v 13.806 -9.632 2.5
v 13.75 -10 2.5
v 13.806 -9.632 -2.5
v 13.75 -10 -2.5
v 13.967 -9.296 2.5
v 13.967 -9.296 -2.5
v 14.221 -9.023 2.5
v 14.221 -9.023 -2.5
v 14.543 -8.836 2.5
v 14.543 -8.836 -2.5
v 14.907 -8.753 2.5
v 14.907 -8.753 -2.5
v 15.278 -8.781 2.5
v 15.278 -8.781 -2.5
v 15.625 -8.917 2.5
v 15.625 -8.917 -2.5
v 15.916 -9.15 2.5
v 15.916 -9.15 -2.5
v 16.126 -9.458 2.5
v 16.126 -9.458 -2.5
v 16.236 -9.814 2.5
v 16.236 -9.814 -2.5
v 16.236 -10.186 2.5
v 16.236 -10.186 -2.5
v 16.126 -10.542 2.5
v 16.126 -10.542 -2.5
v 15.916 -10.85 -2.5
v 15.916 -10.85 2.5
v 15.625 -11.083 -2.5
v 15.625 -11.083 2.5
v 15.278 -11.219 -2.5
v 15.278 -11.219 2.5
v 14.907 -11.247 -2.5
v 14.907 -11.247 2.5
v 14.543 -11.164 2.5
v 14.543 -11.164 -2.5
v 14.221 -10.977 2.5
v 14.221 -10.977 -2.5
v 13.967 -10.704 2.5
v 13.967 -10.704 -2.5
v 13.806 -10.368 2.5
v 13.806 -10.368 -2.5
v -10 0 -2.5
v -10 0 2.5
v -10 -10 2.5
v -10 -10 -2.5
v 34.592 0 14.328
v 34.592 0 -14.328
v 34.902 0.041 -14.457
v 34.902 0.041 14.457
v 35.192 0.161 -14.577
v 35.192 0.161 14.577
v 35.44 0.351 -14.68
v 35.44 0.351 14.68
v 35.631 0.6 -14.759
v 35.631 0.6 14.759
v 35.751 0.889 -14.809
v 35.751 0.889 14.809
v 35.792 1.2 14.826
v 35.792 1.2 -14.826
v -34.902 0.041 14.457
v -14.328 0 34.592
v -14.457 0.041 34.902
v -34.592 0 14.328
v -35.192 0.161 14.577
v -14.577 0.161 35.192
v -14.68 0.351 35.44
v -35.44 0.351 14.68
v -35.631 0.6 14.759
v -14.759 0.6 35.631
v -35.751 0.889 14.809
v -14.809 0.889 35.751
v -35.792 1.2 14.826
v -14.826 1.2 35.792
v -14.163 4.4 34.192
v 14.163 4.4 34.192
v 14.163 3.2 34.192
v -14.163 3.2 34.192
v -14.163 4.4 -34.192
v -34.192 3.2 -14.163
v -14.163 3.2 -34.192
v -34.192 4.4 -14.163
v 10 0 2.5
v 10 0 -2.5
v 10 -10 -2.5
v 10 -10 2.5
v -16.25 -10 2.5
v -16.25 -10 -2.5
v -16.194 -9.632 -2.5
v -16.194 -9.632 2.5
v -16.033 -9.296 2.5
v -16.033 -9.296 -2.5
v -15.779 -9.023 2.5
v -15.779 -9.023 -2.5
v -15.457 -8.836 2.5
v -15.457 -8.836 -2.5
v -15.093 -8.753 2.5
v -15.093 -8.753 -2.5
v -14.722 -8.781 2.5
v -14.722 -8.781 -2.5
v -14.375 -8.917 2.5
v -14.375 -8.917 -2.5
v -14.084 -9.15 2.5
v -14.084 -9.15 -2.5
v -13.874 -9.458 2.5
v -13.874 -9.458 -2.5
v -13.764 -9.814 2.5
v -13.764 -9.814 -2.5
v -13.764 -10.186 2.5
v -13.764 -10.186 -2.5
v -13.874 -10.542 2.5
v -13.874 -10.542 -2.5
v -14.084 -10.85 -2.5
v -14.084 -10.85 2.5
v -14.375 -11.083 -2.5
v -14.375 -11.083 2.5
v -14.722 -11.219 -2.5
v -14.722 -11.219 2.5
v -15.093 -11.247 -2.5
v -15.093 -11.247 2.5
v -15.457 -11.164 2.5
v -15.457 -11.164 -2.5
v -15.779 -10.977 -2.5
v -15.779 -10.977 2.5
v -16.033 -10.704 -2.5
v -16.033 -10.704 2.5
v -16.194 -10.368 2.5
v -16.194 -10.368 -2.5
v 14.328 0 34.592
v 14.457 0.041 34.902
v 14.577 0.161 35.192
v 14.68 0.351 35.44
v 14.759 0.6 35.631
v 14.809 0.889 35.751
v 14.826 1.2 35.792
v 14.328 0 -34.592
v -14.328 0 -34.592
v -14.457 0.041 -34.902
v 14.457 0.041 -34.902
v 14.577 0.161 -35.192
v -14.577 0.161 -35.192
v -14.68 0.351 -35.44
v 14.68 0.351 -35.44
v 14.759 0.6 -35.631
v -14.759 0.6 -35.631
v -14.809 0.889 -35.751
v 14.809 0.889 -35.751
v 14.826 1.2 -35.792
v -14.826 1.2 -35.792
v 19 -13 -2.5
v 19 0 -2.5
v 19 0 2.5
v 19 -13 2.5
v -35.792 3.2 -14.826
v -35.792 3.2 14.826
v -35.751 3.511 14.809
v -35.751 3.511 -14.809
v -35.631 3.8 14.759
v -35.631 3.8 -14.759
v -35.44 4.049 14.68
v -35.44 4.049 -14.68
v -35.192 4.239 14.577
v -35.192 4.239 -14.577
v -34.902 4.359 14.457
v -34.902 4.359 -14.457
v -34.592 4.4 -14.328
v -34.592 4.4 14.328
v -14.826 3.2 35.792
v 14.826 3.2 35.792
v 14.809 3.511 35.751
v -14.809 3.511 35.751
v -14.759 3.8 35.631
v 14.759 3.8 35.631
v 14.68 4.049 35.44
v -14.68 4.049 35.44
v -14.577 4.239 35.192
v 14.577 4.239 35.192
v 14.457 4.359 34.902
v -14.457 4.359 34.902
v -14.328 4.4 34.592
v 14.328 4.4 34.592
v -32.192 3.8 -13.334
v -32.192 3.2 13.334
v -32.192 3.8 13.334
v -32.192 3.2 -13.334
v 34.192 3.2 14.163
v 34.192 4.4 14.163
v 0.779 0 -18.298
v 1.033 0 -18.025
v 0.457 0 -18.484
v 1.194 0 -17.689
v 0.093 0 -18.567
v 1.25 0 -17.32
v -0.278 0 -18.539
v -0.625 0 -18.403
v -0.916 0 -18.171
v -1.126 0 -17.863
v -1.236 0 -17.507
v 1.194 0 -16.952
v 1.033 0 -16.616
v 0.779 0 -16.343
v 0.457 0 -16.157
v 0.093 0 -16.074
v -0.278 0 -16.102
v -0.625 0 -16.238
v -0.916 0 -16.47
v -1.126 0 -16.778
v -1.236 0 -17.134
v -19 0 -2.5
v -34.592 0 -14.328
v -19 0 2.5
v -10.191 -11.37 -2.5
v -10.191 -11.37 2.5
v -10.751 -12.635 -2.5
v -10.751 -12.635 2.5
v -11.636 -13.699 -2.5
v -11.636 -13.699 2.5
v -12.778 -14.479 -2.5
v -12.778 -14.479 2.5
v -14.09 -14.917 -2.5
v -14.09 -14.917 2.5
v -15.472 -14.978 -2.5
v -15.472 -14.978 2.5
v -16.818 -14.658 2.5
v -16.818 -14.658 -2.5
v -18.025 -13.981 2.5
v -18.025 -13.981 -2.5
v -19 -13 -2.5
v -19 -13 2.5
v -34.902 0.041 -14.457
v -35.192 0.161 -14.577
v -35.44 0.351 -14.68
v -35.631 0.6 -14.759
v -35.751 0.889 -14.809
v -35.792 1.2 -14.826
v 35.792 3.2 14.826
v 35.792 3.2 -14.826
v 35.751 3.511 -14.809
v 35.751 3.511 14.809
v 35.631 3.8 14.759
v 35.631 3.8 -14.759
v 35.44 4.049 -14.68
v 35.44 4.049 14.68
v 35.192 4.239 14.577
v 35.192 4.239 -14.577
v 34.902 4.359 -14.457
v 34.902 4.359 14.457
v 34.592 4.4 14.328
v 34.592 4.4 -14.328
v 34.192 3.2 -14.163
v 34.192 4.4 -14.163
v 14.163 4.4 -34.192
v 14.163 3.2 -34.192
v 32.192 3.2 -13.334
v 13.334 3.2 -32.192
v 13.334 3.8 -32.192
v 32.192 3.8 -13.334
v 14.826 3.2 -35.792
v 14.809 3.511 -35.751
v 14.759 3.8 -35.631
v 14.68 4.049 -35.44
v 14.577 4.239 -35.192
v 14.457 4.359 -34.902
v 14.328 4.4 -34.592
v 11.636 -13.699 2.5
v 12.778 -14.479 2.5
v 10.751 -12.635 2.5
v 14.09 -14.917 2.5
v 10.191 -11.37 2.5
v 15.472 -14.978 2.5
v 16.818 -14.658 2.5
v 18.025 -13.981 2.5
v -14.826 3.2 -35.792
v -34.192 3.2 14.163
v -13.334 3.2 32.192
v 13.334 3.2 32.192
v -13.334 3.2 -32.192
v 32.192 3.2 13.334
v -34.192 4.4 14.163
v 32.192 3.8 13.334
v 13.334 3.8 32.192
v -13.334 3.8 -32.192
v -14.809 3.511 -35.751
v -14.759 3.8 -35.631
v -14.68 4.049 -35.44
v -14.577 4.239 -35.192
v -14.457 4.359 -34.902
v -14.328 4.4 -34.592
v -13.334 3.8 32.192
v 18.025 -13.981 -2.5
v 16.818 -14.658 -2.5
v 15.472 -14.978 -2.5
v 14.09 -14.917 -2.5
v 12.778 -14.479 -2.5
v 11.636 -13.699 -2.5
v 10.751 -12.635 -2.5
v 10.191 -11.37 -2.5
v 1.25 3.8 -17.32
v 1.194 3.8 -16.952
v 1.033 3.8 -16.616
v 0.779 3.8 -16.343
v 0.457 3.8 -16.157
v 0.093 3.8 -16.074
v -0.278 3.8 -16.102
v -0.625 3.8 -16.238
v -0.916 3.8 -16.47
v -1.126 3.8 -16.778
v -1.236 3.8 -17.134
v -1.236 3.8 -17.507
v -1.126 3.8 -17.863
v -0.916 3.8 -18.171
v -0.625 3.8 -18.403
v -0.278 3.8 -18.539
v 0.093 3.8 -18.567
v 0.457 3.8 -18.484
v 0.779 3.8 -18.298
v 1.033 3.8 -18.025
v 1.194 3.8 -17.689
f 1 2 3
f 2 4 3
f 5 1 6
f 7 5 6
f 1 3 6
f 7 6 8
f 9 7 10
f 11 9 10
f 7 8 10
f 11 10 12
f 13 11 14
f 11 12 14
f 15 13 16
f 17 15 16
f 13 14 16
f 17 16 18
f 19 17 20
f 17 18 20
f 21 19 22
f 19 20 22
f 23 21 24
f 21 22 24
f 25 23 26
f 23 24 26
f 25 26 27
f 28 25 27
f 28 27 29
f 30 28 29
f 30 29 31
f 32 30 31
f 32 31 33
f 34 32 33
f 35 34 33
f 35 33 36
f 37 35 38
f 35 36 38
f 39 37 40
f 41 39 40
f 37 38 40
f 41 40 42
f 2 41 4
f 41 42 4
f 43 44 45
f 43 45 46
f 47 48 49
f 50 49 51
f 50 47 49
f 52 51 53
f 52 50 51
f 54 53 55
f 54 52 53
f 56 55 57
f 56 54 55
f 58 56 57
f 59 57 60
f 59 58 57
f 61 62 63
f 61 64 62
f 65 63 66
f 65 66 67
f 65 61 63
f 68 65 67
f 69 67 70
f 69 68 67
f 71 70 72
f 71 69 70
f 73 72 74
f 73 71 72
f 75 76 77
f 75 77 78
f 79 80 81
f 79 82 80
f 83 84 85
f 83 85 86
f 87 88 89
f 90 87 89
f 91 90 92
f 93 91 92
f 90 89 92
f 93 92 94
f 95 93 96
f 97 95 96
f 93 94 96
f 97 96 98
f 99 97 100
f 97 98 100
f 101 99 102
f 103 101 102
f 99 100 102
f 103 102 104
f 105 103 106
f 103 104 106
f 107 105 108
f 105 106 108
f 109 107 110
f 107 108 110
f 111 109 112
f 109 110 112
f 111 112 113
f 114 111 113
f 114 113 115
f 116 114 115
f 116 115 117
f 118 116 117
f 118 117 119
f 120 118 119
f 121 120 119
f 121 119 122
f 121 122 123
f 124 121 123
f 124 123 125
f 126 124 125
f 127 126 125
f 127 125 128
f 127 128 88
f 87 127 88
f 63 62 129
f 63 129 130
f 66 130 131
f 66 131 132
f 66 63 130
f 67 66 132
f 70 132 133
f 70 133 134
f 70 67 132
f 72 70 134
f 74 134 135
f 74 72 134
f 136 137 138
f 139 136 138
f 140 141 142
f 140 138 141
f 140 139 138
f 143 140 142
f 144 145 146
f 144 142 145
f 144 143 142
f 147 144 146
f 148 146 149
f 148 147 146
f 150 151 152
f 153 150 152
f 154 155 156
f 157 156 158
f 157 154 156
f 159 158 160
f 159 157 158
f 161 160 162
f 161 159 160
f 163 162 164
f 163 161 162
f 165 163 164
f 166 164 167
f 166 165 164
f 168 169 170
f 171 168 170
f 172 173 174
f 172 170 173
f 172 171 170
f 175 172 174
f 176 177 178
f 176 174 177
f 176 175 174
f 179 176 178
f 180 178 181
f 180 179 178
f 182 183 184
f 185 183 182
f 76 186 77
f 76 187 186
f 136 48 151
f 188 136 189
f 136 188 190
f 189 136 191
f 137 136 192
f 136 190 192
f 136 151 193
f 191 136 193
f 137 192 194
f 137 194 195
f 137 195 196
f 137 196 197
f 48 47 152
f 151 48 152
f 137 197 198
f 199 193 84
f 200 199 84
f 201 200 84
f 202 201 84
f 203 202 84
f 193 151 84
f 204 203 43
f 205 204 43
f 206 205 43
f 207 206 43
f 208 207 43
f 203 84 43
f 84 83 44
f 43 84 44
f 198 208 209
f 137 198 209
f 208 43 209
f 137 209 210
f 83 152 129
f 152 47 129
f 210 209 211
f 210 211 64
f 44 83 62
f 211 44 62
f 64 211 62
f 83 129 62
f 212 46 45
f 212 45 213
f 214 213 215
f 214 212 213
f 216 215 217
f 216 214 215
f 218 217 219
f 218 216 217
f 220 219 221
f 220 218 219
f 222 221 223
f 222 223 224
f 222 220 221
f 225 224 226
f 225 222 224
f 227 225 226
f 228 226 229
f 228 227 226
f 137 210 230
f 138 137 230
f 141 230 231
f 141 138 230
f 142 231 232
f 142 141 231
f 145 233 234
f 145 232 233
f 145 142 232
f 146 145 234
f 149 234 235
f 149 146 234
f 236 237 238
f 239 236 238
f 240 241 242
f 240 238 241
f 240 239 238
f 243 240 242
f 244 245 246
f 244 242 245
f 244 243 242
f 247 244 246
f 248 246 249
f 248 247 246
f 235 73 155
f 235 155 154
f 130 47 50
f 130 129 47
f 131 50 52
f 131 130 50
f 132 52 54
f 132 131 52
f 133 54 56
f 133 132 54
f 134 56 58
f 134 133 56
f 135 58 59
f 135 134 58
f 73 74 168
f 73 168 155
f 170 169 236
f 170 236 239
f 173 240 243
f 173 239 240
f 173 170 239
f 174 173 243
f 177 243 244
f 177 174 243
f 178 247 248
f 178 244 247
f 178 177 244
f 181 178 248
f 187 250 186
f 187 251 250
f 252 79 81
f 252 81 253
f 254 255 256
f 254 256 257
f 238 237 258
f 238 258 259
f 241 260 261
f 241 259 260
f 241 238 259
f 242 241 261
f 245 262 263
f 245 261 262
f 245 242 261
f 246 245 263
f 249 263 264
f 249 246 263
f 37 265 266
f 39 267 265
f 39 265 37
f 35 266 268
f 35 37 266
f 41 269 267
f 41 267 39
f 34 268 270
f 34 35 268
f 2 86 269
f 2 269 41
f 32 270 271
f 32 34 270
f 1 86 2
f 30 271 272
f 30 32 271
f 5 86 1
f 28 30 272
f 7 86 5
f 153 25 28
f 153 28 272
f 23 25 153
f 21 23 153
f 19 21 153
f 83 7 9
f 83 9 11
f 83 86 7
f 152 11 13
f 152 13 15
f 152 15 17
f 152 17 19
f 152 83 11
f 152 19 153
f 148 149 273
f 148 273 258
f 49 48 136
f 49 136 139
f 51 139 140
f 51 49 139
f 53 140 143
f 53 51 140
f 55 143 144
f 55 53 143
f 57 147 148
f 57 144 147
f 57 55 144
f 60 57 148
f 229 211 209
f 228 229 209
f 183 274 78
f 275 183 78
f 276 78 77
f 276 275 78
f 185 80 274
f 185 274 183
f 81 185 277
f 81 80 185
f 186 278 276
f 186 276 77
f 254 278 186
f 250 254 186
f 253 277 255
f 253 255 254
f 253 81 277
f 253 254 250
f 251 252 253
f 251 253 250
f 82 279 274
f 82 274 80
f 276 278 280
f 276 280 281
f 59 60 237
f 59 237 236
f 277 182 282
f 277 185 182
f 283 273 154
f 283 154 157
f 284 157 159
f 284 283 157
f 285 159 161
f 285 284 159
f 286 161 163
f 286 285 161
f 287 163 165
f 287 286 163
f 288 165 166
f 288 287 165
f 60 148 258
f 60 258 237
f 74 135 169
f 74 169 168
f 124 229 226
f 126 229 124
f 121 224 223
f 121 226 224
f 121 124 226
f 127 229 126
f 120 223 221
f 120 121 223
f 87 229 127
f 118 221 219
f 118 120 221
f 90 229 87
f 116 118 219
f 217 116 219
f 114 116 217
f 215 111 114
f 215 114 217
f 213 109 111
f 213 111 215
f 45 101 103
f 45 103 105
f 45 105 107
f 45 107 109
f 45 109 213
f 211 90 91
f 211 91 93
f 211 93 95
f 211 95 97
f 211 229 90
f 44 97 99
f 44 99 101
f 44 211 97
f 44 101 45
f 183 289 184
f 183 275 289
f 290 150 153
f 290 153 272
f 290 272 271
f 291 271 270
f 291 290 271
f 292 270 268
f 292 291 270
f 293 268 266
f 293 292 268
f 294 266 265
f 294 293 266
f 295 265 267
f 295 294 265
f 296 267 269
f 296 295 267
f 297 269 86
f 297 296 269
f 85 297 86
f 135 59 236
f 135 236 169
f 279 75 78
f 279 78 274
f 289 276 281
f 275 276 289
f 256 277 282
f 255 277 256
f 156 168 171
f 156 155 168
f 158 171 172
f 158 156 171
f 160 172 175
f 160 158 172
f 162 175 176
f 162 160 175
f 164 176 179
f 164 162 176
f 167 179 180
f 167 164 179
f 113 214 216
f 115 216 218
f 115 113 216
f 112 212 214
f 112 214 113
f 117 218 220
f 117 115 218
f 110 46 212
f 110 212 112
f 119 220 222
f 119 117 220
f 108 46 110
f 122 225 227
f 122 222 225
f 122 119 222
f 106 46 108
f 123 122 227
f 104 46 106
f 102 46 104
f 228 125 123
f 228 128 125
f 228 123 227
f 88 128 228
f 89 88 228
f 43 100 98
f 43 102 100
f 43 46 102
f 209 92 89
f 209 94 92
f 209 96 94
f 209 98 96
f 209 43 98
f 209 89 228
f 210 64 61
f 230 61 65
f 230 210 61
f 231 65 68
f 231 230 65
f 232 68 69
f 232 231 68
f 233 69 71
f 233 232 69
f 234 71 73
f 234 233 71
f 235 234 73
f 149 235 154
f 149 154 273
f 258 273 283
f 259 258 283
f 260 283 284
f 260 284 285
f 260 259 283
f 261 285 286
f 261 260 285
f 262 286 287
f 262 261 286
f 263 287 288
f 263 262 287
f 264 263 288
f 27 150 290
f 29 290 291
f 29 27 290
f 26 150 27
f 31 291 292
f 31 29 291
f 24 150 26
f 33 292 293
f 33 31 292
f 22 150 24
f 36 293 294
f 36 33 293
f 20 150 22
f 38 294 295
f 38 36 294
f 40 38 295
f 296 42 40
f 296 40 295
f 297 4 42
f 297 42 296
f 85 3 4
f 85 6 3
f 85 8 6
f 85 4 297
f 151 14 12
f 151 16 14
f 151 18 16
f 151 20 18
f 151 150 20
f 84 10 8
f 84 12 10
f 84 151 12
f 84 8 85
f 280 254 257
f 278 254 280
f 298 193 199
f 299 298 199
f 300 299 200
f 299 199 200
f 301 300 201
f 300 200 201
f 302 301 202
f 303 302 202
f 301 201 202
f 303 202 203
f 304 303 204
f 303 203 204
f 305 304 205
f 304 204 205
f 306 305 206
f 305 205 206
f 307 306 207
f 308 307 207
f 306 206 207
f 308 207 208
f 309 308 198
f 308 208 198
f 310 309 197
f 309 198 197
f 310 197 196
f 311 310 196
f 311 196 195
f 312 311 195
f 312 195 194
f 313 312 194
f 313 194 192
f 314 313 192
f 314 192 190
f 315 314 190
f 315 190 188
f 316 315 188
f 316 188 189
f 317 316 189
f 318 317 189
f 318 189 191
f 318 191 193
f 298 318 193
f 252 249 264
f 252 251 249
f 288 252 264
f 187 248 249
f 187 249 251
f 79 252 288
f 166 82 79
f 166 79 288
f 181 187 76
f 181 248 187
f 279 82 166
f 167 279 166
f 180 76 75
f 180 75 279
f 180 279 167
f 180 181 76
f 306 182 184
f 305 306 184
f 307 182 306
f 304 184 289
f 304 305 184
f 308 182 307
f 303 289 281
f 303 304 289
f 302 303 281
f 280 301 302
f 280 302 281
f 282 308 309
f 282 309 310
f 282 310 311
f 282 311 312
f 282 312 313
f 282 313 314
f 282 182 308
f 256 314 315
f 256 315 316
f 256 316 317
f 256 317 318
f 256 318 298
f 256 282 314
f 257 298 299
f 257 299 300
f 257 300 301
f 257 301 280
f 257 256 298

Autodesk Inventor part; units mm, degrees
ref_plane "YZ Plane" through (0, 0, 0) normal (1, 0, 0) x (0, 1, 0)
ref_plane "XZ Plane" through (0, 0, 0) normal (0, 1, 0) x (-1, 0, 0)
ref_plane "XY Plane" through (0, 0, 0) normal (0, 0, 1) x (1, 0, 0)
sketch "스케치3" plane through (0, 0, 0) normal (0, 1, 0) x (-1, 0, 0)
  line L0 (35.7919, -14.8255) -> (14.8255, -35.7919)
  line L1 (14.8255, -35.7919) -> (-14.8255, -35.7919)
  line L2 (-14.8255, -35.7919) -> (-35.7919, -14.8255)
  line L3 (-35.7919, -14.8255) -> (-35.7919, 14.8255)
  line L4 (-35.7919, 14.8255) -> (-14.8255, 35.7919)
  line L5 (-14.8255, 35.7919) -> (14.8255, 35.7919)
  line L6 (14.8255, 35.7919) -> (35.7919, 14.8255)
  line L7 (35.7919, 14.8255) -> (35.7919, -14.8255)
  line L8 (32.5919, -13.5) -> (13.5, -32.5919)
  line L9 (13.5, -32.5919) -> (-13.5, -32.5919)
  line L10 (-13.5, -32.5919) -> (-32.5919, -13.5)
  line L11 (-32.5919, -13.5) -> (-32.5919, 13.5)
  line L12 (-32.5919, 13.5) -> (-13.5, 32.5919)
  line L13 (-13.5, 32.5919) -> (13.5, 32.5919)
  line L14 (13.5, 32.5919) -> (32.5919, 13.5)
  line L15 (32.5919, 13.5) -> (32.5919, -13.5)
  point P0 (0, 0)
  point P1 (0, 0)
  point P2 (0, 0)
  point P3 (0, 0)
  dimension "d43" = 27
  dimension "d44" = 3.2
extrude "돌출2" add sketch "스케치3" along normal blind 4.4 contours L0 L1 L2 L3 L4 L5 L6 L7 | L8 L9 L10 L11 L12 L13 L14 L15
sketch "스케치4" plane through (0, 4.4, 0) normal (0, 1, 0) x (1, 0, 0)
  line L0 (13.5, -32.5919) -> (-13.5, -32.5919)
  line L1 (-13.5, -32.5919) -> (-32.5919, -13.5)
  line L2 (-32.5919, -13.5) -> (-32.5919, 13.5)
  line L3 (-32.5919, 13.5) -> (-13.5, 32.5919)
  line L4 (-13.5, 32.5919) -> (13.5, 32.5919)
  line L5 (13.5, 32.5919) -> (32.5919, 13.5)
  line L6 (32.5919, 13.5) -> (32.5919, -13.5)
  line L7 (32.5919, -13.5) -> (13.5, -32.5919)
  line L8 (-14.1627, 34.1919) -> (14.1627, 34.1919)
  line L9 (14.1627, 34.1919) -> (34.1919, 14.1627)
  line L10 (34.1919, 14.1627) -> (34.1919, -14.1627)
  line L11 (34.1919, -14.1627) -> (14.1627, -34.1919)
  line L12 (14.1627, -34.1919) -> (-14.1627, -34.1919)
  line L13 (-14.1627, -34.1919) -> (-34.1919, -14.1627)
  line L14 (-34.1919, -14.1627) -> (-34.1919, 14.1627)
  line L15 (-34.1919, 14.1627) -> (-14.1627, 34.1919)
  line L16 (-13.3343, 32.1919) -> (13.3343, 32.1919)
  line L17 (13.3343, 32.1919) -> (32.1919, 13.3343)
  line L18 (32.1919, 13.3343) -> (32.1919, -13.3343)
  line L19 (32.1919, -13.3343) -> (13.3343, -32.1919)
  line L20 (13.3343, -32.1919) -> (-13.3343, -32.1919)
  line L21 (-13.3343, -32.1919) -> (-32.1919, -13.3343)
  line L22 (-32.1919, -13.3343) -> (-32.1919, 13.3343)
  line L23 (-32.1919, 13.3343) -> (-13.3343, 32.1919)
  line L24 (-35.7919, 14.8255) -> (-35.7919, -14.8255) projected
  point P0 (0, 0)
  point P1 (0, 0)
  point P2 (0, 0)
  point P3 (0, 0)
  dimension "d7" = 27
  dimension "d60" = 1.6
  dimension "d61" = 2
extrude "돌출3" cut sketch "스케치4" against normal blind 1.2 contours L0 L1 L2 L3 L4 L5 L6 L7 | L8 L9 L10 L11 L12 L13 L14 L15 | L16 L17 L18 L19 L20 L21 L22 L23
sketch "스케치5" plane through (0, 0, 0) normal (0, -1, 0) x (1, 0, 0)
  line L0 (10, 2.5) -> (20, 2.5)
  line L1 (20, 2.5) -> (20, -2.5)
  line L2 (20, -2.5) -> (10, -2.5)
  line L3 (10, -2.5) -> (10, 2.5)
  line L4 (10, 2.5) -> (20, -2.5) construction
  line L5 (20, 2.5) -> (10, -2.5) construction
  line L6 (-20, 2.5) -> (-10, 2.5)
  line L7 (-10, 2.5) -> (-10, -2.5)
  line L8 (-10, -2.5) -> (-20, -2.5)
  line L9 (-20, -2.5) -> (-20, 2.5)
  line L10 (-20, 2.5) -> (-10, -2.5) construction
  line L11 (-10, 2.5) -> (-20, -2.5) construction
  point P0 (0, 0)
  point P1 (15, 0)
  point P2 (-15, 0)
  dimension "d11" = 10
  dimension "d12" = 5
  dimension "d13" = 10
  dimension "d16" = 30
extrude "돌출4" add sketch "스케치5" along normal blind 10
sketch "스케치6" plane through (-10, 0, -2.5) normal (0, 0, -1) x (-1, 0, 0)
  circle A0 centre (5, -10) radius 5
  circle A1 centre (-25, -10) radius 5
  line L0 (-20, -10) -> (-30, -10) projected
  line L1 (10, -10) -> (0, -10) projected
  point P0 (-10, 0)
  dimension "d23" = 10
  dimension "d24" = 10
extrude "돌출5" add sketch "스케치6" against normal blind 5
sketch "스케치7" plane through (-10, 0, -2.5) normal (0, 0, -1) x (-1, 0, 0)
  circle A0 centre (5, -10) radius 1.25
  line L0 (10, 0) -> (10, -10) projected
  line L1 (0, 0) -> (10, 0) projected
  line L2 (4.7788, 0) -> (0, 0)
  circle A1 centre (-25, -10) radius 1.25
  point P0 (-10, 0)
  dimension "d27" = 2.5
  dimension "d28" = 5
  dimension "d31" = 30
extrude "돌출6" cut sketch "스케치7" against normal blind 5
sketch "스케치8" plane through (0, 0, 0) normal (0, -1, 0) x (1, 0, 0)
  circle A0 centre (0, -17.3205) radius 1.25
  line L0 (-10, 2.5) -> (-10, -2.5) projected
  point P0 (0, 0)
  point P1 (-10, 0)
  dimension "d38" = 2.5
  dimension "d39" = 17.3205
sketch "스케치9" plane through (0, 3.2, 0) normal (0, 1, 0) x (1, 0, 0)
  line L0 (-13.3343, 32.1919) -> (13.3343, 32.1919)
  line L1 (13.3343, 32.1919) -> (32.1919, 13.3343)
  line L2 (32.1919, 13.3343) -> (32.1919, -13.3343)
  line L3 (32.1919, -13.3343) -> (13.3343, -32.1919)
  line L4 (13.3343, -32.1919) -> (-13.3343, -32.1919)
  line L5 (-13.3343, -32.1919) -> (-32.1919, -13.3343)
  line L6 (-32.1919, -13.3343) -> (-32.1919, 13.3343)
  line L7 (-32.1919, 13.3343) -> (-13.3343, 32.1919)
  line L8 (-14.1627, 34.1919) -> (14.1627, 34.1919) projected
  line L9 (-12.0917, 29.1919) -> (12.0917, 29.1919)
  line L10 (12.0917, 29.1919) -> (29.1919, 12.0917)
  line L11 (29.1919, 12.0917) -> (29.1919, -12.0917)
  line L12 (29.1919, -12.0917) -> (12.0917, -29.1919)
  line L13 (12.0917, -29.1919) -> (-12.0917, -29.1919)
  line L14 (-12.0917, -29.1919) -> (-29.1919, -12.0917)
  line L15 (-29.1919, -12.0917) -> (-29.1919, 12.0917)
  line L16 (-29.1919, 12.0917) -> (-12.0917, 29.1919)
  point P0 (0, 0)
  point P1 (0, 0)
  point P2 (0, 0)
  dimension "d46" = 2
  dimension "d47" = 3
extrude "돌출8" add sketch "스케치9" along normal blind 0.6 contours L0 L1 L2 L3 L4 L5 L6 L7 | L9 L10 L11 L12 L13 L14 L15 L16
fillet "모깎기1" radius 1.2 16 edges at (-35.7919, 4.4, 0) (-25.3087, 4.4, 25.3087) (0, 4.4, 35.7919) (25.3087, 4.4, 25.3087) (35.7919, 4.4, 0) (25.3087, 4.4, -25.3087) (0, 4.4, -35.7919) (-25.3087, 4.4, -25.3087) (25.3087, 0, 25.3087) (0, 0, 35.7919) (-25.3087, 0, 25.3087) (-35.7919, 0, 0) (-25.3087, 0, -25.3087) (0, 0, -35.7919) (25.3087, 0, -25.3087) (35.7919, 0, 0)
sketch "스케치10" plane through (0, 0, 0) normal (0, -1, 0) x (1, 0, 0)
  line L0 (-20, 2.5) -> (-10, 2.5) projected
  line L1 (-10, -2.5) -> (-20, -2.5) projected
  line L2 (-20, 2.5) -> (-19, 2.5)
  line L3 (-19, 2.5) -> (-19, -2.5)
  line L4 (-19, -2.5) -> (-20, -2.5)
  line L5 (-20, -2.5) -> (-20, 2.5)
  line L6 (20, -2.5) -> (10, -2.5) projected
  line L7 (10, 2.5) -> (20, 2.5) projected
  line L8 (20, -2.5) -> (19, -2.5)
  line L9 (19, -2.5) -> (19, 2.5)
  line L10 (19, 2.5) -> (20, 2.5)
  line L11 (20, 2.5) -> (20, -2.5)
  point P0 (0, 0)
  dimension "d54" = 1
  dimension "d55" = 1
extrude "돌출9" cut sketch "스케치10" along normal blind 15
extrude "돌출10" cut sketch "스케치8" against normal blind 5
equation "\"d55\" = d54"
properties part number "OV-PAM_top_2"
